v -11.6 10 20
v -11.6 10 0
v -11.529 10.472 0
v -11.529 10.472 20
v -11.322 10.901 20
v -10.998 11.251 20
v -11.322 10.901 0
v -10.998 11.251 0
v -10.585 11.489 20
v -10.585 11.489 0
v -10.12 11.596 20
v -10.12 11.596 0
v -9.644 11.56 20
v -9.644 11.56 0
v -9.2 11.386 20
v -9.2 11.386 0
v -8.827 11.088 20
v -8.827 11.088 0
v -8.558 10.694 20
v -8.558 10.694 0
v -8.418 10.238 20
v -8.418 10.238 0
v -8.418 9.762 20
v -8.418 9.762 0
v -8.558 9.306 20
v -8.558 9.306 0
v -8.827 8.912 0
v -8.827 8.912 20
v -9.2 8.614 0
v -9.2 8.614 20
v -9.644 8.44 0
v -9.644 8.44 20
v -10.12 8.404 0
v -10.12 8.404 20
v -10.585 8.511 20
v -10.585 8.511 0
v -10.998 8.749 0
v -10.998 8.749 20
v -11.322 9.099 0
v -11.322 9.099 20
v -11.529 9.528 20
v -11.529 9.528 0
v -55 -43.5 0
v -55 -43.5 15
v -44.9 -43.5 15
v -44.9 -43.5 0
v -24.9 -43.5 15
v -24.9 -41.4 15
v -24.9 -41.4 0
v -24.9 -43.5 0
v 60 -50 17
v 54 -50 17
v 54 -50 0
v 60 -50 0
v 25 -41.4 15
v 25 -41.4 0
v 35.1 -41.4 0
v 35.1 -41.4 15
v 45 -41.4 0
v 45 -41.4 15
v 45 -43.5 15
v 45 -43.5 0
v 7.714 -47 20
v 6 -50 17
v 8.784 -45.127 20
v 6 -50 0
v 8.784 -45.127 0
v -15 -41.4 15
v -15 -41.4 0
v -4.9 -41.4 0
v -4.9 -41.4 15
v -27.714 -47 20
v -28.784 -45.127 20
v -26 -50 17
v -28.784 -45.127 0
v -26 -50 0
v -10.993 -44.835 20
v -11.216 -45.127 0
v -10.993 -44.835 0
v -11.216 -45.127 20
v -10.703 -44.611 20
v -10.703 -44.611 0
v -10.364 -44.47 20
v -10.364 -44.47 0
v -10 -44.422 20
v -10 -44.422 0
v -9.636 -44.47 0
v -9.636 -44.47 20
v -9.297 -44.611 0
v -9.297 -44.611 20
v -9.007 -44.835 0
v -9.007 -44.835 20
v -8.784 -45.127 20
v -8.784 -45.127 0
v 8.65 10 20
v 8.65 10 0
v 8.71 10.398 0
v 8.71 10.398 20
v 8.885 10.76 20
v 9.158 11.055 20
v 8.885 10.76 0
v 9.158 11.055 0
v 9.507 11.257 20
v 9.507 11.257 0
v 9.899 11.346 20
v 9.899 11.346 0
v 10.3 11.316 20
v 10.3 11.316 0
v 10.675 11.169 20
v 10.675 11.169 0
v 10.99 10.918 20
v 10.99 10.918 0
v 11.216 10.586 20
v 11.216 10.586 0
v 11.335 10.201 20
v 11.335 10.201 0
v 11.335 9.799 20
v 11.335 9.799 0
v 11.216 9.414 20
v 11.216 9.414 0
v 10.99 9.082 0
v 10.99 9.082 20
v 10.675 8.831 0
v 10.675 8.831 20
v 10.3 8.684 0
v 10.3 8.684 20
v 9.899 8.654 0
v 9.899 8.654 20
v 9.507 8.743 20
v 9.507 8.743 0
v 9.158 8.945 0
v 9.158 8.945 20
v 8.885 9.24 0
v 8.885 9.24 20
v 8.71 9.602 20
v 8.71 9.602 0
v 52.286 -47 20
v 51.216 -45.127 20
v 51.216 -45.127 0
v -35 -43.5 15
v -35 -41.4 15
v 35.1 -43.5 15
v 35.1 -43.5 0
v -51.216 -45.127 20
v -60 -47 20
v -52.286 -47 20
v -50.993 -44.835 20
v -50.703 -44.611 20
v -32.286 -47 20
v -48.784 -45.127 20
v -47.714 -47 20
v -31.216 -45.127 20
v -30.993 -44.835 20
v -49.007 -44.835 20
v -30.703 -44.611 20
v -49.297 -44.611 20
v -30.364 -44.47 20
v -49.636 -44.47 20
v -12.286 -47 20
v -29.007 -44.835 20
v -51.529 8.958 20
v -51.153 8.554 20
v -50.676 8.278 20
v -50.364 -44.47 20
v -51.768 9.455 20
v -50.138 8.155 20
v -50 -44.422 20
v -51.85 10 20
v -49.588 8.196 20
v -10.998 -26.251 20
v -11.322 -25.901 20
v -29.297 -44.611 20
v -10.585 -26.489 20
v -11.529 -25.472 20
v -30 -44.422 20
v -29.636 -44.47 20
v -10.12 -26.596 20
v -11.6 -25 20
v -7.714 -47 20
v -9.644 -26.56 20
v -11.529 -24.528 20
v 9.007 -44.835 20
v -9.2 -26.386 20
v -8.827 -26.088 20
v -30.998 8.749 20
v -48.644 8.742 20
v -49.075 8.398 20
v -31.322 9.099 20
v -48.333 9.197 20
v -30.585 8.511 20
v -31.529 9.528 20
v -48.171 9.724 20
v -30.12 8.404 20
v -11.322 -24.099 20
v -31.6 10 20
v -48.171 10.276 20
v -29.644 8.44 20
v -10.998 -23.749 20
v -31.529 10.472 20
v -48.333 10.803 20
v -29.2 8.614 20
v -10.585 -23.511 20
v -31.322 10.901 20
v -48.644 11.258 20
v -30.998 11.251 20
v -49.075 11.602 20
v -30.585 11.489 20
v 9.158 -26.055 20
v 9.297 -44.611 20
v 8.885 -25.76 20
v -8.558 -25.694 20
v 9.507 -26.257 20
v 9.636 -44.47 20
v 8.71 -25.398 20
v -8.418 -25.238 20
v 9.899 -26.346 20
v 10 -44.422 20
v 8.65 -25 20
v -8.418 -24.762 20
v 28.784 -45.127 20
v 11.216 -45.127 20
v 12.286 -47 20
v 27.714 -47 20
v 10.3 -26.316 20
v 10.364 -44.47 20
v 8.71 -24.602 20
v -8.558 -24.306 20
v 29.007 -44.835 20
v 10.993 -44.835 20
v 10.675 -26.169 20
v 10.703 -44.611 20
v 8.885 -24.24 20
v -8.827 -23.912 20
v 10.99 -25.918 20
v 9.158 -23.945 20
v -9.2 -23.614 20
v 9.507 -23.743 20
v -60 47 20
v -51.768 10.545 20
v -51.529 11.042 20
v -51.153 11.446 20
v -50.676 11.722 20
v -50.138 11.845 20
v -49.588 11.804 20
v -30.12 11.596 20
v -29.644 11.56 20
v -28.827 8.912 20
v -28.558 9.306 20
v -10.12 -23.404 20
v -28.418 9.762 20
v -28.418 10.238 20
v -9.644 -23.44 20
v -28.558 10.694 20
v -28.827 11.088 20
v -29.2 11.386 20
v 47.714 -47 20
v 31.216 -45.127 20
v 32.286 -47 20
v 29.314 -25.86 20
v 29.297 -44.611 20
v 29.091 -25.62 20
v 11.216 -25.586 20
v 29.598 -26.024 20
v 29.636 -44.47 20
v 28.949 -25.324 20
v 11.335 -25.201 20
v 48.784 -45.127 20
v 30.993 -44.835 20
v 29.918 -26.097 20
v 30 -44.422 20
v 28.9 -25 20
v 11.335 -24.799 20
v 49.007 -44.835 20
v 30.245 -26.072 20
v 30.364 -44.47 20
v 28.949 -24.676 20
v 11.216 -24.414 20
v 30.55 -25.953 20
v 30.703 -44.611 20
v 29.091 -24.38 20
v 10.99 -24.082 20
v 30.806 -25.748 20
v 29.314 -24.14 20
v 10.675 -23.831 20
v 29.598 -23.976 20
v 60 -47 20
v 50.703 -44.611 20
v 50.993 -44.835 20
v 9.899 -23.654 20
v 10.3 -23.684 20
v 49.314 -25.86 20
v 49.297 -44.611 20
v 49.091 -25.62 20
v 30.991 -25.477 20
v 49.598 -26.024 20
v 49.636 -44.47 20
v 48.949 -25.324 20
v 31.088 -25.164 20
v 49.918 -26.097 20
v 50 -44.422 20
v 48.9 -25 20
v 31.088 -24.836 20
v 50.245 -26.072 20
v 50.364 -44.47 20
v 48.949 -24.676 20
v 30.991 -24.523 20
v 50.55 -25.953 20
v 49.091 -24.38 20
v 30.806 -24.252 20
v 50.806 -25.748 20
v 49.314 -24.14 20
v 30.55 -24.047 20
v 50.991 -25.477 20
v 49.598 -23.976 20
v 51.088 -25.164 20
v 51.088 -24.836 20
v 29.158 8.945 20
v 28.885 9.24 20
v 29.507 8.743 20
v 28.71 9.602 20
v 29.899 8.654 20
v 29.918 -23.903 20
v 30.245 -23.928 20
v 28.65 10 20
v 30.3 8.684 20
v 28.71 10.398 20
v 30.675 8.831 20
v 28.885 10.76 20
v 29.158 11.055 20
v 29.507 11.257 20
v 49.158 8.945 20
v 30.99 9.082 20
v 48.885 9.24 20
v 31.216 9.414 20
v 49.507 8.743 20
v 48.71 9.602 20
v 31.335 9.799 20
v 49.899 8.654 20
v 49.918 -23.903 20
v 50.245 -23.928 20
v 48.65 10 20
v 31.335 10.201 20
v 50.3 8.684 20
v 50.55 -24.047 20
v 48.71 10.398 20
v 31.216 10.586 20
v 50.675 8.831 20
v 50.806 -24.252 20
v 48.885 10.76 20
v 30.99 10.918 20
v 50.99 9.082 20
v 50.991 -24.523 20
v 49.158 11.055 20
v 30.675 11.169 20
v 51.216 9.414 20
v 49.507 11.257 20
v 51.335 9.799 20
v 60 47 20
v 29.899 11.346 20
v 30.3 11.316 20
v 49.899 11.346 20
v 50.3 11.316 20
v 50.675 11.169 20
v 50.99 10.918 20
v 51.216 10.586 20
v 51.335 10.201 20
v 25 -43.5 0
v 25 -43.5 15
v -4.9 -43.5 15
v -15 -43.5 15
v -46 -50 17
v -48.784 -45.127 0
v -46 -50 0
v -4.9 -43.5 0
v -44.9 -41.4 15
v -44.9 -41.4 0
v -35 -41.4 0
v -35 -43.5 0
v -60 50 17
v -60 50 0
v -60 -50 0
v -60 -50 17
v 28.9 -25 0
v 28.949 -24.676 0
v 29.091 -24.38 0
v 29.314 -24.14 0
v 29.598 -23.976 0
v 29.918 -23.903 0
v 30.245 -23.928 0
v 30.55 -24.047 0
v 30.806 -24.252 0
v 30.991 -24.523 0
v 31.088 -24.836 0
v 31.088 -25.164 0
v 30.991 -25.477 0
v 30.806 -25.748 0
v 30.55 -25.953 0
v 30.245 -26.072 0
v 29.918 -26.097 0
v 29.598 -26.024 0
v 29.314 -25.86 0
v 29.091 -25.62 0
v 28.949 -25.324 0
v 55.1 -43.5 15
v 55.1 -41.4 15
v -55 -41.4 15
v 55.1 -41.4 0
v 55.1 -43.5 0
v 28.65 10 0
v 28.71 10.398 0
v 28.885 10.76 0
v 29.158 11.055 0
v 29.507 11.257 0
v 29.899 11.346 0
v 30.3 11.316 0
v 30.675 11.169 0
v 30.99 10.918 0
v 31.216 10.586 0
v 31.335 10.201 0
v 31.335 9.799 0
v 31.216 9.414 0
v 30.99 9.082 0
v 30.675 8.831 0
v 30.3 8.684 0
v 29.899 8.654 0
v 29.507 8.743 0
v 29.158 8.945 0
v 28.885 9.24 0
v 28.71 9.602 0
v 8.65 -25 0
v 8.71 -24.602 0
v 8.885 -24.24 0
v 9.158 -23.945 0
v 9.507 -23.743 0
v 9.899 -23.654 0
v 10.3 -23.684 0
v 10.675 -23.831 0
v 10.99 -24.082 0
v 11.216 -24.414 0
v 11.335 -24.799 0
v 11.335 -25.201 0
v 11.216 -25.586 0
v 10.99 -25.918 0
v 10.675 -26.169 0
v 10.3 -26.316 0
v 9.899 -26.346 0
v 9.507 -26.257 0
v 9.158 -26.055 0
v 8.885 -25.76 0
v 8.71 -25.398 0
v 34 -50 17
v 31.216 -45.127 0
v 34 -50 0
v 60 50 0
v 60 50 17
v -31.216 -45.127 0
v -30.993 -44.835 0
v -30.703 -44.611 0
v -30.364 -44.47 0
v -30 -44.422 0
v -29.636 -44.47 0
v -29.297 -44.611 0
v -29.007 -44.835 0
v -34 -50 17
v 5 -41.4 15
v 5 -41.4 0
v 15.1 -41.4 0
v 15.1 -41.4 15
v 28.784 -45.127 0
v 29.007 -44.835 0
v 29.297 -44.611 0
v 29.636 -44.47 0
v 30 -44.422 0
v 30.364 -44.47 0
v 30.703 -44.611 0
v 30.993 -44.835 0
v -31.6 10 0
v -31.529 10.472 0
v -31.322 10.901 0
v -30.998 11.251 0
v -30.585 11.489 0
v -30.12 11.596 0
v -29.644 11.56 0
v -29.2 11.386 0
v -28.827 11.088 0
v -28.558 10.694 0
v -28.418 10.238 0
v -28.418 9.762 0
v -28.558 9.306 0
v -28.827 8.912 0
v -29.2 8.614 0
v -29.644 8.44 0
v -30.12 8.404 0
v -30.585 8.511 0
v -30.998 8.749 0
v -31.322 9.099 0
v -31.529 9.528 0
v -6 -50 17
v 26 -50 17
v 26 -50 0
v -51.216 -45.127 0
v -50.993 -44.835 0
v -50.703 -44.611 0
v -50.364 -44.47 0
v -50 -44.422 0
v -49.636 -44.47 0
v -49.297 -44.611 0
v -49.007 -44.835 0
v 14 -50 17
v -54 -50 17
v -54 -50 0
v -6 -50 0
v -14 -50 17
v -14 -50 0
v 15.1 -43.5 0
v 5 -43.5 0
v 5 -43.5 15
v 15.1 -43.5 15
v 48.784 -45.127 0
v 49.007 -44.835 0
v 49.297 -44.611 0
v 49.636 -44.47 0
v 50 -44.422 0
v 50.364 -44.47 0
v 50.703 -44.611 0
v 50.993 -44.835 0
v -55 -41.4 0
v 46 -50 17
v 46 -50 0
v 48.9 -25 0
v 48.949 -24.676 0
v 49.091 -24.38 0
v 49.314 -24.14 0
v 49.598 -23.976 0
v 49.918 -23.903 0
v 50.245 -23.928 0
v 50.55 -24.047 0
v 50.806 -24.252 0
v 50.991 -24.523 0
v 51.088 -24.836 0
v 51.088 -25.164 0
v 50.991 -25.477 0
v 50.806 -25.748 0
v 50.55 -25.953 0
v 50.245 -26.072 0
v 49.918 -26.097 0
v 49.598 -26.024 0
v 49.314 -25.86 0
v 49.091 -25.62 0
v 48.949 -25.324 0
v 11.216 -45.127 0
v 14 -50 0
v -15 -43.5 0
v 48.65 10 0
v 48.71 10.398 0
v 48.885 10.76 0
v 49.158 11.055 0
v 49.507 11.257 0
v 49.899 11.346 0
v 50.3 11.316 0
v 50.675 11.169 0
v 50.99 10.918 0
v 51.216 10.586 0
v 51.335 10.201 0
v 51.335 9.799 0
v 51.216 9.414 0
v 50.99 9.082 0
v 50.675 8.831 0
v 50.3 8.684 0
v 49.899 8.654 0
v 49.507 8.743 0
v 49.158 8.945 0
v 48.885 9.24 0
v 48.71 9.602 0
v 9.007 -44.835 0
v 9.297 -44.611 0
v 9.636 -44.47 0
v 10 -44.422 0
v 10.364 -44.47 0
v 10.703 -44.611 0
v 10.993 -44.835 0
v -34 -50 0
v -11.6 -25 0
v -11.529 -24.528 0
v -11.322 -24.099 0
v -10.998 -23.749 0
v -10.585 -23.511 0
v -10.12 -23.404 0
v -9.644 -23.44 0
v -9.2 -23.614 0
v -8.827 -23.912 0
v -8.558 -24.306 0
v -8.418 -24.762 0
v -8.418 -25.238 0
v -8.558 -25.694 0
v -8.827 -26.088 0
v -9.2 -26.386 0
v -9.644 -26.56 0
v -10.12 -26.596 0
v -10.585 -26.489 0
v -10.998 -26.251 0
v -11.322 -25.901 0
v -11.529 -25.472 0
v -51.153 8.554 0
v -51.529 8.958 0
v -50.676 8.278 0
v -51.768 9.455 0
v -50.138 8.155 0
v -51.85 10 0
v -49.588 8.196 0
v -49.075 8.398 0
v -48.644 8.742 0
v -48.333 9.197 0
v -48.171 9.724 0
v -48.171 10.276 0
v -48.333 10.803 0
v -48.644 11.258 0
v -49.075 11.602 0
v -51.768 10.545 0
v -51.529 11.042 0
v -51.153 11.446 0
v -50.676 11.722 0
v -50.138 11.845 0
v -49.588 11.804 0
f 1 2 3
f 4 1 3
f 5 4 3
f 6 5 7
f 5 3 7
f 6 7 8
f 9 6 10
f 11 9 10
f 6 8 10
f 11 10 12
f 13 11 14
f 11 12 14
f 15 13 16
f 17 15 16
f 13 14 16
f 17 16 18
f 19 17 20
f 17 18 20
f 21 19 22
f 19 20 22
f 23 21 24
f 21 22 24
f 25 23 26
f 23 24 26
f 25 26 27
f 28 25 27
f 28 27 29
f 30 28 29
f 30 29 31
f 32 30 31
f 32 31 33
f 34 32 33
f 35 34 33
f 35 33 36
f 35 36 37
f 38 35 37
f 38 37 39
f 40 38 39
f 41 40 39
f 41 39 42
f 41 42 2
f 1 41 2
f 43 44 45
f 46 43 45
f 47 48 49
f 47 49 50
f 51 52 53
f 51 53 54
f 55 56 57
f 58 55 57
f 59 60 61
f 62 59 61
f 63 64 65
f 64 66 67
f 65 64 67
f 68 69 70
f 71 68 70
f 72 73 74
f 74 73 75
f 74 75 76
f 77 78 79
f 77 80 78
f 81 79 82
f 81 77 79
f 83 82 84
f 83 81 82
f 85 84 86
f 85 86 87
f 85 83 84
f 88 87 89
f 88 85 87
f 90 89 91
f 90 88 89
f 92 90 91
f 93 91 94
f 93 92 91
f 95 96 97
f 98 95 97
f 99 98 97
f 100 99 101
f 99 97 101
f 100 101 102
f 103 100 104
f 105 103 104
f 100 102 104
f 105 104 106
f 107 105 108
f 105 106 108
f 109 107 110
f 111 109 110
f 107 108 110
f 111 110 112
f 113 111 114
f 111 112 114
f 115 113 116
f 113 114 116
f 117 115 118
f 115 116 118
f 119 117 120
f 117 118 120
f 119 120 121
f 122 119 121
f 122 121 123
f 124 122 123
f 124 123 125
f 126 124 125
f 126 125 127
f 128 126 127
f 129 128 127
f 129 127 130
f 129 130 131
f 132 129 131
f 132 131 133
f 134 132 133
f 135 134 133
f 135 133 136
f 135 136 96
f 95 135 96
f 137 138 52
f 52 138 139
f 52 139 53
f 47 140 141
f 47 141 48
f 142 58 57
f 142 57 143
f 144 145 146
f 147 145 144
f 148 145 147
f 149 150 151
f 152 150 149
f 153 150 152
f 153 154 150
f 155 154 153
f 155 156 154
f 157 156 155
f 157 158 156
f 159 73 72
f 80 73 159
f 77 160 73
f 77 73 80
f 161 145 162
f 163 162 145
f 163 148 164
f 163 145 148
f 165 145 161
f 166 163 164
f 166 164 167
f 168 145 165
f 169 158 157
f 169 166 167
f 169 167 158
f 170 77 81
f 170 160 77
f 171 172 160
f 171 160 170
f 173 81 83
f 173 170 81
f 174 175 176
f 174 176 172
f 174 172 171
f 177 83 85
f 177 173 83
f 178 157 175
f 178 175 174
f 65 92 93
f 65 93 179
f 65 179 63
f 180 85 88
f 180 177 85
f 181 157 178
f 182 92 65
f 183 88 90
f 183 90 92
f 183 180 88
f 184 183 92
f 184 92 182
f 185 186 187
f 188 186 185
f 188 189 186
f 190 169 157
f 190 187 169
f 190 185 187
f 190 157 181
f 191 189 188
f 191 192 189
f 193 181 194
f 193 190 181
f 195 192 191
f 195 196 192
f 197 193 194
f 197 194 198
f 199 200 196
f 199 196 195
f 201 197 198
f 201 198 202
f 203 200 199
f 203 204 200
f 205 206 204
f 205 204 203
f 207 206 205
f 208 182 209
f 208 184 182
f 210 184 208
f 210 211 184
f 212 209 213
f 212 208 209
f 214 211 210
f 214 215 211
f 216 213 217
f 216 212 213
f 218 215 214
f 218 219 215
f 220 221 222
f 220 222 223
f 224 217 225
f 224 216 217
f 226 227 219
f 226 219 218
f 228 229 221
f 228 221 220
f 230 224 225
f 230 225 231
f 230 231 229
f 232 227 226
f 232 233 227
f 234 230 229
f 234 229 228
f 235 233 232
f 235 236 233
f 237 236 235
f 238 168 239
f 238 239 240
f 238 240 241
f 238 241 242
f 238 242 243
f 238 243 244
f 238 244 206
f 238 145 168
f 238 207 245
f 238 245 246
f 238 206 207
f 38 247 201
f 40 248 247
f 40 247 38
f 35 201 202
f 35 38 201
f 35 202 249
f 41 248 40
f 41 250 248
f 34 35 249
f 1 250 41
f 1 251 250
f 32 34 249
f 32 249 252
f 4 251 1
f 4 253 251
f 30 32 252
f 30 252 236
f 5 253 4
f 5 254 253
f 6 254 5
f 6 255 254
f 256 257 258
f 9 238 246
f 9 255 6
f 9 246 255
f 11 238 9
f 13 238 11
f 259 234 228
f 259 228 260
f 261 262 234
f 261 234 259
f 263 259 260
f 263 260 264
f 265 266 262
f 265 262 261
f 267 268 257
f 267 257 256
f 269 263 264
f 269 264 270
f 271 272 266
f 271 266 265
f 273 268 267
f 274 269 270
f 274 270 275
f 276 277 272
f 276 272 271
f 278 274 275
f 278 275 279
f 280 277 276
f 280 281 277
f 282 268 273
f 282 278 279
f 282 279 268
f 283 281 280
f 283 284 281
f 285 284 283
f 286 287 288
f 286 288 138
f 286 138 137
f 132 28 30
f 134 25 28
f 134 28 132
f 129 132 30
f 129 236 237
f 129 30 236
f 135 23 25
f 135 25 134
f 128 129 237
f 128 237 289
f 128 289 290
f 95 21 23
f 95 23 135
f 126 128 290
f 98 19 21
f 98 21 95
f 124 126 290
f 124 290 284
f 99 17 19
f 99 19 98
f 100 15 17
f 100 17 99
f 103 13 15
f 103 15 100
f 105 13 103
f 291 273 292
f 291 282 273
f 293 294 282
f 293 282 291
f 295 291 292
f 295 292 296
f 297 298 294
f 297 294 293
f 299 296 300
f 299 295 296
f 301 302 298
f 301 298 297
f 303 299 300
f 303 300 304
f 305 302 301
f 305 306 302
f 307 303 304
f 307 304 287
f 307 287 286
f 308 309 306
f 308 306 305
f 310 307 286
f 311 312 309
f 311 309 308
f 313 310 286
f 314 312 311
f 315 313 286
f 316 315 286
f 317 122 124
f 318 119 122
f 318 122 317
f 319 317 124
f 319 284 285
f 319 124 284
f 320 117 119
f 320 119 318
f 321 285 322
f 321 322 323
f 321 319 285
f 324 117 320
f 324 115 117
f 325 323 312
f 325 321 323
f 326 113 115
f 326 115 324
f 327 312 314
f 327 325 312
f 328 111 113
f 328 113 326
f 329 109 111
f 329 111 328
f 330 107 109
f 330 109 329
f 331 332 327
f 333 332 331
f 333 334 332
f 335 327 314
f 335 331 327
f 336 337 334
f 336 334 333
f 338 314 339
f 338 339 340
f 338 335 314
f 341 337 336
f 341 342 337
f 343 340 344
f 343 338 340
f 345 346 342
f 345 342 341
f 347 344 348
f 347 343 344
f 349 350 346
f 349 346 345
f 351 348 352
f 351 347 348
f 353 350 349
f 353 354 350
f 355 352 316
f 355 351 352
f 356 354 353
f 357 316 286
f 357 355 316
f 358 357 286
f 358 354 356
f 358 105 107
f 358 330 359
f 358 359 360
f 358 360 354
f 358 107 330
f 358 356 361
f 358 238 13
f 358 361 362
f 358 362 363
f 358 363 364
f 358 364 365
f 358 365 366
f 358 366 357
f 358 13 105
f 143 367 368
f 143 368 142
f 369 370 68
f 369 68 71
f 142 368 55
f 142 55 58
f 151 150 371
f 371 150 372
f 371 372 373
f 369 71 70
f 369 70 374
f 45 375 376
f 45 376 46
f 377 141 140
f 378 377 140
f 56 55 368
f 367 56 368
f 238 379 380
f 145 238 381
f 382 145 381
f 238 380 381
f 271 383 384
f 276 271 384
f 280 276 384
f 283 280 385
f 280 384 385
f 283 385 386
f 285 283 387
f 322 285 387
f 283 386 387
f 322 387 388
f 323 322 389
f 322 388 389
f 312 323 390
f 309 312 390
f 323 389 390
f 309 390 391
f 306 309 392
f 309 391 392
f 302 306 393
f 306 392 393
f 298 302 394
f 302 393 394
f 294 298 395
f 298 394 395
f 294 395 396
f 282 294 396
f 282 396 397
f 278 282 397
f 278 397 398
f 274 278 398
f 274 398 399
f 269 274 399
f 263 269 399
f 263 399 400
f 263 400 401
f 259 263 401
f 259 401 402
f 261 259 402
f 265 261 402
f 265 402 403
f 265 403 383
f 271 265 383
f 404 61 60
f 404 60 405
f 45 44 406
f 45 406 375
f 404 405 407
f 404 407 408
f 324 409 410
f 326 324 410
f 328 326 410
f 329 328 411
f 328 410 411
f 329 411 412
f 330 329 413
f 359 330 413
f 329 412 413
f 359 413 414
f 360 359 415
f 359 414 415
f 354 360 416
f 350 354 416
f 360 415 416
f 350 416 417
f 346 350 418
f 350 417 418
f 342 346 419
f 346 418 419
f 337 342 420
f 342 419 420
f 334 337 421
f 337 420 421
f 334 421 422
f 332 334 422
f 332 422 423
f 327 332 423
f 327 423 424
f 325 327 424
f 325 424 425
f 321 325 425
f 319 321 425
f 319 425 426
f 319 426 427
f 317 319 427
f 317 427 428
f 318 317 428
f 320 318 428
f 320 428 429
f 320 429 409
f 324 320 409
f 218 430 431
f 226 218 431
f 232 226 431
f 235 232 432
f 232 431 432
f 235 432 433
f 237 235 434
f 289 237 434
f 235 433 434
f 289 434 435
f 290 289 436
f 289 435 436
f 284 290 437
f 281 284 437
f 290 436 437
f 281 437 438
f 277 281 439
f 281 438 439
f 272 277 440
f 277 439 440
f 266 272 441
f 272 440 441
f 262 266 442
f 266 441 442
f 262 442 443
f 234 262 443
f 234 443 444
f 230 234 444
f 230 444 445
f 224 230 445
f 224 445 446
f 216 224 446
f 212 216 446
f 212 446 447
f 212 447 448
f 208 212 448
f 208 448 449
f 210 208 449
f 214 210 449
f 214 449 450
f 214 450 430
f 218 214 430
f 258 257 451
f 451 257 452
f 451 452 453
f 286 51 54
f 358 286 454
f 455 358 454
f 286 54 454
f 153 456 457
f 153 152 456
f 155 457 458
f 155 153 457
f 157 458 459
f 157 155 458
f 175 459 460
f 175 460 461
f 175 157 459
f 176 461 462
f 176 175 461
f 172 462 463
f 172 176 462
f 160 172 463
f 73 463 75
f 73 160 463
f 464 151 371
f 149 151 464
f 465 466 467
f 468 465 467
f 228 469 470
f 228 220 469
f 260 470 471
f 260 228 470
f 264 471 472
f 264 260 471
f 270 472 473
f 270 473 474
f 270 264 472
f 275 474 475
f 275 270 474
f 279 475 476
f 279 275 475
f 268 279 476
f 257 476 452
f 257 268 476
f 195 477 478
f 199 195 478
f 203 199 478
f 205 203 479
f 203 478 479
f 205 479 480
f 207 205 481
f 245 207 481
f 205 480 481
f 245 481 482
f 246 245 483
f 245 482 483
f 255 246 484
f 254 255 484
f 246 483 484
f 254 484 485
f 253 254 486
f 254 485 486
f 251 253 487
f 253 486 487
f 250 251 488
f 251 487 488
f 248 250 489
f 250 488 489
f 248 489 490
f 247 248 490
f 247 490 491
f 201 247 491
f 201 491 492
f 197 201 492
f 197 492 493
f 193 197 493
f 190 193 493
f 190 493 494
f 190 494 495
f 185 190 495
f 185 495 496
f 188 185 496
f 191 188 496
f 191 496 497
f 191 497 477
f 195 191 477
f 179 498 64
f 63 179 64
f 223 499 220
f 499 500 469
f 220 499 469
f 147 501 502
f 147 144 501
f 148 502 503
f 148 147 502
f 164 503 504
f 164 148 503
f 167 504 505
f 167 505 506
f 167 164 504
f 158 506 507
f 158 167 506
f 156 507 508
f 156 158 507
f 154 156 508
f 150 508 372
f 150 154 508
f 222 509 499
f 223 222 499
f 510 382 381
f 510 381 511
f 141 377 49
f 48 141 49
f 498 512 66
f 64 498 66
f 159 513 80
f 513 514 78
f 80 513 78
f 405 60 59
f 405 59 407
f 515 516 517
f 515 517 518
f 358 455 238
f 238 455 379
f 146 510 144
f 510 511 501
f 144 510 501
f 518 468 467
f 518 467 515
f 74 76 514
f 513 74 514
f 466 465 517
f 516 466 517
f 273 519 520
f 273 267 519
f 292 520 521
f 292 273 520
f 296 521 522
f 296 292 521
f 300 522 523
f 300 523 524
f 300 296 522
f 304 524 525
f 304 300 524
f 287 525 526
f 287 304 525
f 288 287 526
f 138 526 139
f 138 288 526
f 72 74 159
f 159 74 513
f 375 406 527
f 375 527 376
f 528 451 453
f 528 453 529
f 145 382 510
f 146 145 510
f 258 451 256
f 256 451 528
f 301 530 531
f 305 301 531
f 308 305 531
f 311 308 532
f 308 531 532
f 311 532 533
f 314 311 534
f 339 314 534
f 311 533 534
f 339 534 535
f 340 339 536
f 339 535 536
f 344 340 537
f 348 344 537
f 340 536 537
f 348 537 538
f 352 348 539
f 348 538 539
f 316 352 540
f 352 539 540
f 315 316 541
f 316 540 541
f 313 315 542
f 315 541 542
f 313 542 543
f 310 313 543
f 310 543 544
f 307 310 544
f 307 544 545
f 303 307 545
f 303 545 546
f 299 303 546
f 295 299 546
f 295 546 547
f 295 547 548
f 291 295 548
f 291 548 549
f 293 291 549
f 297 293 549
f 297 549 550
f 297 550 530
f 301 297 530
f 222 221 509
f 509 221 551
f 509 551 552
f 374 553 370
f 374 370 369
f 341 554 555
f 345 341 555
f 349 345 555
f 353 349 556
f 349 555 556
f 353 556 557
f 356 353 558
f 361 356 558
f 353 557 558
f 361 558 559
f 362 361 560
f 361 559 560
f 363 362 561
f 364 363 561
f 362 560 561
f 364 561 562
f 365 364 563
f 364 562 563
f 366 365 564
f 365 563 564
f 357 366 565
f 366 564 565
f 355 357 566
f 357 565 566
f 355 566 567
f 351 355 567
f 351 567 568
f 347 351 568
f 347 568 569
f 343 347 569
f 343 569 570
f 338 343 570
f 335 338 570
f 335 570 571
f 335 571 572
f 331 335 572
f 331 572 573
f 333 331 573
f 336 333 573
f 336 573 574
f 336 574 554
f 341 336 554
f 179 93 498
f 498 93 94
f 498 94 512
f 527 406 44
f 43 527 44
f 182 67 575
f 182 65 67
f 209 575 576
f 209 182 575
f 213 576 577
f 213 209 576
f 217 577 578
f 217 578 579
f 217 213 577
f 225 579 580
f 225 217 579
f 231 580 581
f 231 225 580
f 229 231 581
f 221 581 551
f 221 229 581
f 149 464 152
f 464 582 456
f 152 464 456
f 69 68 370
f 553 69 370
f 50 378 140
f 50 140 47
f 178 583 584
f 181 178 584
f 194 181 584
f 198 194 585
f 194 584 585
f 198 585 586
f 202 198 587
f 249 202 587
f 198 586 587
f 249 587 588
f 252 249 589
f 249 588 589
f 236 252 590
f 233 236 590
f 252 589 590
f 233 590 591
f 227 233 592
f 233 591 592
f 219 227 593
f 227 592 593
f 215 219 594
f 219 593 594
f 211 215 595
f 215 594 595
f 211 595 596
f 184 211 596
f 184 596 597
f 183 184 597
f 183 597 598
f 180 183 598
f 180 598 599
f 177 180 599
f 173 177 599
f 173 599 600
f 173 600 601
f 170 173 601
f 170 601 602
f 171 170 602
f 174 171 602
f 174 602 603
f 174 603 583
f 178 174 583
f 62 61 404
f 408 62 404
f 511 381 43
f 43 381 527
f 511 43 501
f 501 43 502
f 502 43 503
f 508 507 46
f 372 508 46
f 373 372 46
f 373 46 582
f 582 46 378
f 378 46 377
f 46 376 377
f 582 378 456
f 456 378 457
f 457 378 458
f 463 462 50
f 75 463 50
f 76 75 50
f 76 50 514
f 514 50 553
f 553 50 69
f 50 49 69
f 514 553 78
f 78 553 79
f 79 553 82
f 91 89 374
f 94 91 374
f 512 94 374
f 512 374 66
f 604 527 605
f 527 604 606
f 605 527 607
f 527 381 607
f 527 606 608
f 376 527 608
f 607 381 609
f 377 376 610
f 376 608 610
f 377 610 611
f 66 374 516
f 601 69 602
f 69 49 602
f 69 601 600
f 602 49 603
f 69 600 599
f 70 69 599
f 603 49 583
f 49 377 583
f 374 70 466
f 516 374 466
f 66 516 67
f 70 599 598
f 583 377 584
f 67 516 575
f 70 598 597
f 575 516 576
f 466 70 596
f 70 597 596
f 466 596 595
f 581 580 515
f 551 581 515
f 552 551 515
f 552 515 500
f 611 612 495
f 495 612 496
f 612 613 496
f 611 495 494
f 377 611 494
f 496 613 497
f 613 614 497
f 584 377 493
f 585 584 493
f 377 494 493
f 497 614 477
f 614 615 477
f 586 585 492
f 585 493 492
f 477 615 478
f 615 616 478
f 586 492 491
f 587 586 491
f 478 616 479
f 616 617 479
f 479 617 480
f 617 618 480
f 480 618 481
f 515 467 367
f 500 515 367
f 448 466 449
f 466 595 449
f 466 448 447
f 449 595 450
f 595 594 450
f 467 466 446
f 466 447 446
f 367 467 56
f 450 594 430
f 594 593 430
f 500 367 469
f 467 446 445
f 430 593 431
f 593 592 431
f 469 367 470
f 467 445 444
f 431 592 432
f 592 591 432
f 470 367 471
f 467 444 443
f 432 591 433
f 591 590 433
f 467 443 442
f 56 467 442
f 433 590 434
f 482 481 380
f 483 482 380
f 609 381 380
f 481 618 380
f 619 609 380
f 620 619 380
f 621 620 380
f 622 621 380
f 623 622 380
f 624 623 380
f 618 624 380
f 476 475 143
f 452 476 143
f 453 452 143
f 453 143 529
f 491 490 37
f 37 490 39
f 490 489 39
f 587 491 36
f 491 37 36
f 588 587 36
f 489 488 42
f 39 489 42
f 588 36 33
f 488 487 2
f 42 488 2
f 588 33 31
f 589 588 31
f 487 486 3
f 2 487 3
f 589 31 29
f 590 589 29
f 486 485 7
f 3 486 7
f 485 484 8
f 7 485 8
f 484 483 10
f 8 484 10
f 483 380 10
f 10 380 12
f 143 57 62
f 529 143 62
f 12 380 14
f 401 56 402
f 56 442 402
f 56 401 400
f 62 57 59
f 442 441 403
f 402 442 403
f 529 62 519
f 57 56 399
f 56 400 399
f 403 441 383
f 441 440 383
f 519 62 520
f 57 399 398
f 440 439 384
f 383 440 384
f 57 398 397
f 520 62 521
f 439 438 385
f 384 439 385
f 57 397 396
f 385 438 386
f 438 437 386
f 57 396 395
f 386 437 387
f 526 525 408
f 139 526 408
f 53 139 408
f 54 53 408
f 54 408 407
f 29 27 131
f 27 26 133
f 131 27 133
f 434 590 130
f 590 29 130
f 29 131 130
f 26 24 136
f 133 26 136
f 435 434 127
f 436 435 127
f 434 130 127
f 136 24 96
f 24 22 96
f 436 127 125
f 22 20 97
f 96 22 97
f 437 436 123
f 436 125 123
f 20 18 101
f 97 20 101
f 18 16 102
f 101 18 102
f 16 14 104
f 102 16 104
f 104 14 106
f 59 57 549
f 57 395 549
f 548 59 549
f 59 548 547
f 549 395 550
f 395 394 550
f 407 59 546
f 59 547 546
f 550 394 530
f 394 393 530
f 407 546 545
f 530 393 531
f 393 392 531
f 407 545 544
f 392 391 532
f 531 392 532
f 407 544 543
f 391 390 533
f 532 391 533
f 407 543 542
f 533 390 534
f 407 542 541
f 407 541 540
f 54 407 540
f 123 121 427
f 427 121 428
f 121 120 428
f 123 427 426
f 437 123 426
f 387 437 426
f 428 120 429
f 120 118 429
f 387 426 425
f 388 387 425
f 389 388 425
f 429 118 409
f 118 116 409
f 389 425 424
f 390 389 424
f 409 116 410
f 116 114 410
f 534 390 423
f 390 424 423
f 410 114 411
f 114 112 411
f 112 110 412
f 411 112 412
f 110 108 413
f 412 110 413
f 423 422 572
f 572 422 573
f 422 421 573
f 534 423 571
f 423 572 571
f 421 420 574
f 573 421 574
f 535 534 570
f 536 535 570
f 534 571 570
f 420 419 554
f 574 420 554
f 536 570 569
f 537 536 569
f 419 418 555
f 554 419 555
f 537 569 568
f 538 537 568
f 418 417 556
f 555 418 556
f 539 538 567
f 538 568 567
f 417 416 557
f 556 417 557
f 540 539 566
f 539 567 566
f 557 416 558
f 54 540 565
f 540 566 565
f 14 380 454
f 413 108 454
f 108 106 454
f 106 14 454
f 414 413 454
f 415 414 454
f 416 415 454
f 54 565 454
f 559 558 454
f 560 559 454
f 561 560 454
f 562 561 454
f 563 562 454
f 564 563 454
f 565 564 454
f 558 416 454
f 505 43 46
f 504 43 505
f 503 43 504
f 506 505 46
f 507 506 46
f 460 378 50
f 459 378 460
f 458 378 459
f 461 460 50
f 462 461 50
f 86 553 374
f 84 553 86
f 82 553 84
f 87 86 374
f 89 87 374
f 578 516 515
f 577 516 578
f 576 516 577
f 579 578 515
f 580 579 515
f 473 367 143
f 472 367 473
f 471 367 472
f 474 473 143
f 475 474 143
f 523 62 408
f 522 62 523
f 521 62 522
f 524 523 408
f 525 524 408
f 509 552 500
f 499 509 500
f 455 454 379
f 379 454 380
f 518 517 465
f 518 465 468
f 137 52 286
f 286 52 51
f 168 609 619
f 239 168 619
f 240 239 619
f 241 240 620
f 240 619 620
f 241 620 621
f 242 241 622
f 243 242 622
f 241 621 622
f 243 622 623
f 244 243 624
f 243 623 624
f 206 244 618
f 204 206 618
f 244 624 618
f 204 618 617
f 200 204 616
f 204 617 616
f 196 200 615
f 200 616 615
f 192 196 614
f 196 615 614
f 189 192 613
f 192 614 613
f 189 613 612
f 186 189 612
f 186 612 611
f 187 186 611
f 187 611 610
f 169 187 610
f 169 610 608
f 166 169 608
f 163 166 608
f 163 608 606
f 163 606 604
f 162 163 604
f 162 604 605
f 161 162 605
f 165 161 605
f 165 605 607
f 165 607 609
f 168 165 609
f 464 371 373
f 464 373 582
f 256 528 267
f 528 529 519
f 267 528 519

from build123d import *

# Parameters (mm, degrees)
F1_DEPTH = 20
F2_R     = 1.4
F3_W     = 10.1
F3_H     = 2.1
F4_DEPTH = 15
F5_SIZE  = 3
F7_D     = 2.2
F8_D     = 2.7
F9_D     = 3.2
F10_D    = 3.7


with BuildPart() as f1:
    # F0 (on Top) → F1 (new body)
    with BuildSketch(Plane.XY):
        Polygon((-46, -50), (-40, -50), (-34, -50), (-30, -43), (-26, -50), (-20, -50), (-14, -50), (-10, -43), (-6, -50), (0, -50), (6, -50), (10, -43), (14, -50), (20, -50), (26, -50), (30, -43), (34, -50), (40, -50), (46, -50), (50, -43), (54, -50), (60, -50), (60, 50), (-60, 50), (-60, -50), (-54, -50), (-50, -43), align=None)
    extrude(amount=F1_DEPTH)

    # F2
    f2_edges = [f1.edges().sort_by_distance(p)[0] for p in [
        (-50, -43, 10),
        (-30, -43, 10),
        (-10, -43, 10),
        (10, -43, 10),
        (30, -43, 10),
        (50, -43, 10),
    ]]
    fillet(f2_edges, radius=F2_R)

    # F3 (on face) → F4 (cut)
    with BuildSketch(Plane(origin=(0, 0, 0), x_dir=(1, 0, 0), z_dir=(0, 0, -1))):
        with Locations((-49.95, 42.45)):
            Rectangle(F3_W, F3_H)
        with Locations((-29.95, 42.45)):
            Rectangle(F3_W, F3_H)
        with Locations((-9.95, 42.45)):
            Rectangle(F3_W, F3_H)
        with Locations((10.05, 42.45)):
            Rectangle(F3_W, F3_H)
        with Locations((30.05, 42.45)):
            Rectangle(F3_W, F3_H)
        with Locations((50.05, 42.45)):
            Rectangle(F3_W, F3_H)
    extrude(amount=-F4_DEPTH, mode=Mode.SUBTRACT)

    # F5
    f5_edges = [f1.edges().sort_by_distance(p)[0] for p in [
        (0, 50, 20),
        (-40, -50, 20),
        (-57, -50, 20),
        (-20, -50, 20),
        (0, -50, 20),
        (20, -50, 20),
        (40, -50, 20),
        (57, -50, 20),
    ]]
    chamfer(f5_edges, length=F5_SIZE)

    # F7 (through all)
    with Locations(Plane.XY.offset(20)):
        with Locations((50, -25), (30, -25)):
            Hole(F7_D / 2)

    # F8 (through all)
    with Locations(Plane.XY.offset(20)):
        with Locations((50, 10), (30, 10), (10, 10), (10, -25)):
            Hole(F8_D / 2)

    # F9 (through all)
    with Locations(Plane.XY.offset(20)):
        with Locations((-10, 10), (-30, 10), (-10, -25)):
            Hole(F9_D / 2)

    # F10 (through all)
    with Locations(Plane.XY.offset(20)):
        with Locations((-50, 10)):
            Hole(F10_D / 2)


solid = f1.part
